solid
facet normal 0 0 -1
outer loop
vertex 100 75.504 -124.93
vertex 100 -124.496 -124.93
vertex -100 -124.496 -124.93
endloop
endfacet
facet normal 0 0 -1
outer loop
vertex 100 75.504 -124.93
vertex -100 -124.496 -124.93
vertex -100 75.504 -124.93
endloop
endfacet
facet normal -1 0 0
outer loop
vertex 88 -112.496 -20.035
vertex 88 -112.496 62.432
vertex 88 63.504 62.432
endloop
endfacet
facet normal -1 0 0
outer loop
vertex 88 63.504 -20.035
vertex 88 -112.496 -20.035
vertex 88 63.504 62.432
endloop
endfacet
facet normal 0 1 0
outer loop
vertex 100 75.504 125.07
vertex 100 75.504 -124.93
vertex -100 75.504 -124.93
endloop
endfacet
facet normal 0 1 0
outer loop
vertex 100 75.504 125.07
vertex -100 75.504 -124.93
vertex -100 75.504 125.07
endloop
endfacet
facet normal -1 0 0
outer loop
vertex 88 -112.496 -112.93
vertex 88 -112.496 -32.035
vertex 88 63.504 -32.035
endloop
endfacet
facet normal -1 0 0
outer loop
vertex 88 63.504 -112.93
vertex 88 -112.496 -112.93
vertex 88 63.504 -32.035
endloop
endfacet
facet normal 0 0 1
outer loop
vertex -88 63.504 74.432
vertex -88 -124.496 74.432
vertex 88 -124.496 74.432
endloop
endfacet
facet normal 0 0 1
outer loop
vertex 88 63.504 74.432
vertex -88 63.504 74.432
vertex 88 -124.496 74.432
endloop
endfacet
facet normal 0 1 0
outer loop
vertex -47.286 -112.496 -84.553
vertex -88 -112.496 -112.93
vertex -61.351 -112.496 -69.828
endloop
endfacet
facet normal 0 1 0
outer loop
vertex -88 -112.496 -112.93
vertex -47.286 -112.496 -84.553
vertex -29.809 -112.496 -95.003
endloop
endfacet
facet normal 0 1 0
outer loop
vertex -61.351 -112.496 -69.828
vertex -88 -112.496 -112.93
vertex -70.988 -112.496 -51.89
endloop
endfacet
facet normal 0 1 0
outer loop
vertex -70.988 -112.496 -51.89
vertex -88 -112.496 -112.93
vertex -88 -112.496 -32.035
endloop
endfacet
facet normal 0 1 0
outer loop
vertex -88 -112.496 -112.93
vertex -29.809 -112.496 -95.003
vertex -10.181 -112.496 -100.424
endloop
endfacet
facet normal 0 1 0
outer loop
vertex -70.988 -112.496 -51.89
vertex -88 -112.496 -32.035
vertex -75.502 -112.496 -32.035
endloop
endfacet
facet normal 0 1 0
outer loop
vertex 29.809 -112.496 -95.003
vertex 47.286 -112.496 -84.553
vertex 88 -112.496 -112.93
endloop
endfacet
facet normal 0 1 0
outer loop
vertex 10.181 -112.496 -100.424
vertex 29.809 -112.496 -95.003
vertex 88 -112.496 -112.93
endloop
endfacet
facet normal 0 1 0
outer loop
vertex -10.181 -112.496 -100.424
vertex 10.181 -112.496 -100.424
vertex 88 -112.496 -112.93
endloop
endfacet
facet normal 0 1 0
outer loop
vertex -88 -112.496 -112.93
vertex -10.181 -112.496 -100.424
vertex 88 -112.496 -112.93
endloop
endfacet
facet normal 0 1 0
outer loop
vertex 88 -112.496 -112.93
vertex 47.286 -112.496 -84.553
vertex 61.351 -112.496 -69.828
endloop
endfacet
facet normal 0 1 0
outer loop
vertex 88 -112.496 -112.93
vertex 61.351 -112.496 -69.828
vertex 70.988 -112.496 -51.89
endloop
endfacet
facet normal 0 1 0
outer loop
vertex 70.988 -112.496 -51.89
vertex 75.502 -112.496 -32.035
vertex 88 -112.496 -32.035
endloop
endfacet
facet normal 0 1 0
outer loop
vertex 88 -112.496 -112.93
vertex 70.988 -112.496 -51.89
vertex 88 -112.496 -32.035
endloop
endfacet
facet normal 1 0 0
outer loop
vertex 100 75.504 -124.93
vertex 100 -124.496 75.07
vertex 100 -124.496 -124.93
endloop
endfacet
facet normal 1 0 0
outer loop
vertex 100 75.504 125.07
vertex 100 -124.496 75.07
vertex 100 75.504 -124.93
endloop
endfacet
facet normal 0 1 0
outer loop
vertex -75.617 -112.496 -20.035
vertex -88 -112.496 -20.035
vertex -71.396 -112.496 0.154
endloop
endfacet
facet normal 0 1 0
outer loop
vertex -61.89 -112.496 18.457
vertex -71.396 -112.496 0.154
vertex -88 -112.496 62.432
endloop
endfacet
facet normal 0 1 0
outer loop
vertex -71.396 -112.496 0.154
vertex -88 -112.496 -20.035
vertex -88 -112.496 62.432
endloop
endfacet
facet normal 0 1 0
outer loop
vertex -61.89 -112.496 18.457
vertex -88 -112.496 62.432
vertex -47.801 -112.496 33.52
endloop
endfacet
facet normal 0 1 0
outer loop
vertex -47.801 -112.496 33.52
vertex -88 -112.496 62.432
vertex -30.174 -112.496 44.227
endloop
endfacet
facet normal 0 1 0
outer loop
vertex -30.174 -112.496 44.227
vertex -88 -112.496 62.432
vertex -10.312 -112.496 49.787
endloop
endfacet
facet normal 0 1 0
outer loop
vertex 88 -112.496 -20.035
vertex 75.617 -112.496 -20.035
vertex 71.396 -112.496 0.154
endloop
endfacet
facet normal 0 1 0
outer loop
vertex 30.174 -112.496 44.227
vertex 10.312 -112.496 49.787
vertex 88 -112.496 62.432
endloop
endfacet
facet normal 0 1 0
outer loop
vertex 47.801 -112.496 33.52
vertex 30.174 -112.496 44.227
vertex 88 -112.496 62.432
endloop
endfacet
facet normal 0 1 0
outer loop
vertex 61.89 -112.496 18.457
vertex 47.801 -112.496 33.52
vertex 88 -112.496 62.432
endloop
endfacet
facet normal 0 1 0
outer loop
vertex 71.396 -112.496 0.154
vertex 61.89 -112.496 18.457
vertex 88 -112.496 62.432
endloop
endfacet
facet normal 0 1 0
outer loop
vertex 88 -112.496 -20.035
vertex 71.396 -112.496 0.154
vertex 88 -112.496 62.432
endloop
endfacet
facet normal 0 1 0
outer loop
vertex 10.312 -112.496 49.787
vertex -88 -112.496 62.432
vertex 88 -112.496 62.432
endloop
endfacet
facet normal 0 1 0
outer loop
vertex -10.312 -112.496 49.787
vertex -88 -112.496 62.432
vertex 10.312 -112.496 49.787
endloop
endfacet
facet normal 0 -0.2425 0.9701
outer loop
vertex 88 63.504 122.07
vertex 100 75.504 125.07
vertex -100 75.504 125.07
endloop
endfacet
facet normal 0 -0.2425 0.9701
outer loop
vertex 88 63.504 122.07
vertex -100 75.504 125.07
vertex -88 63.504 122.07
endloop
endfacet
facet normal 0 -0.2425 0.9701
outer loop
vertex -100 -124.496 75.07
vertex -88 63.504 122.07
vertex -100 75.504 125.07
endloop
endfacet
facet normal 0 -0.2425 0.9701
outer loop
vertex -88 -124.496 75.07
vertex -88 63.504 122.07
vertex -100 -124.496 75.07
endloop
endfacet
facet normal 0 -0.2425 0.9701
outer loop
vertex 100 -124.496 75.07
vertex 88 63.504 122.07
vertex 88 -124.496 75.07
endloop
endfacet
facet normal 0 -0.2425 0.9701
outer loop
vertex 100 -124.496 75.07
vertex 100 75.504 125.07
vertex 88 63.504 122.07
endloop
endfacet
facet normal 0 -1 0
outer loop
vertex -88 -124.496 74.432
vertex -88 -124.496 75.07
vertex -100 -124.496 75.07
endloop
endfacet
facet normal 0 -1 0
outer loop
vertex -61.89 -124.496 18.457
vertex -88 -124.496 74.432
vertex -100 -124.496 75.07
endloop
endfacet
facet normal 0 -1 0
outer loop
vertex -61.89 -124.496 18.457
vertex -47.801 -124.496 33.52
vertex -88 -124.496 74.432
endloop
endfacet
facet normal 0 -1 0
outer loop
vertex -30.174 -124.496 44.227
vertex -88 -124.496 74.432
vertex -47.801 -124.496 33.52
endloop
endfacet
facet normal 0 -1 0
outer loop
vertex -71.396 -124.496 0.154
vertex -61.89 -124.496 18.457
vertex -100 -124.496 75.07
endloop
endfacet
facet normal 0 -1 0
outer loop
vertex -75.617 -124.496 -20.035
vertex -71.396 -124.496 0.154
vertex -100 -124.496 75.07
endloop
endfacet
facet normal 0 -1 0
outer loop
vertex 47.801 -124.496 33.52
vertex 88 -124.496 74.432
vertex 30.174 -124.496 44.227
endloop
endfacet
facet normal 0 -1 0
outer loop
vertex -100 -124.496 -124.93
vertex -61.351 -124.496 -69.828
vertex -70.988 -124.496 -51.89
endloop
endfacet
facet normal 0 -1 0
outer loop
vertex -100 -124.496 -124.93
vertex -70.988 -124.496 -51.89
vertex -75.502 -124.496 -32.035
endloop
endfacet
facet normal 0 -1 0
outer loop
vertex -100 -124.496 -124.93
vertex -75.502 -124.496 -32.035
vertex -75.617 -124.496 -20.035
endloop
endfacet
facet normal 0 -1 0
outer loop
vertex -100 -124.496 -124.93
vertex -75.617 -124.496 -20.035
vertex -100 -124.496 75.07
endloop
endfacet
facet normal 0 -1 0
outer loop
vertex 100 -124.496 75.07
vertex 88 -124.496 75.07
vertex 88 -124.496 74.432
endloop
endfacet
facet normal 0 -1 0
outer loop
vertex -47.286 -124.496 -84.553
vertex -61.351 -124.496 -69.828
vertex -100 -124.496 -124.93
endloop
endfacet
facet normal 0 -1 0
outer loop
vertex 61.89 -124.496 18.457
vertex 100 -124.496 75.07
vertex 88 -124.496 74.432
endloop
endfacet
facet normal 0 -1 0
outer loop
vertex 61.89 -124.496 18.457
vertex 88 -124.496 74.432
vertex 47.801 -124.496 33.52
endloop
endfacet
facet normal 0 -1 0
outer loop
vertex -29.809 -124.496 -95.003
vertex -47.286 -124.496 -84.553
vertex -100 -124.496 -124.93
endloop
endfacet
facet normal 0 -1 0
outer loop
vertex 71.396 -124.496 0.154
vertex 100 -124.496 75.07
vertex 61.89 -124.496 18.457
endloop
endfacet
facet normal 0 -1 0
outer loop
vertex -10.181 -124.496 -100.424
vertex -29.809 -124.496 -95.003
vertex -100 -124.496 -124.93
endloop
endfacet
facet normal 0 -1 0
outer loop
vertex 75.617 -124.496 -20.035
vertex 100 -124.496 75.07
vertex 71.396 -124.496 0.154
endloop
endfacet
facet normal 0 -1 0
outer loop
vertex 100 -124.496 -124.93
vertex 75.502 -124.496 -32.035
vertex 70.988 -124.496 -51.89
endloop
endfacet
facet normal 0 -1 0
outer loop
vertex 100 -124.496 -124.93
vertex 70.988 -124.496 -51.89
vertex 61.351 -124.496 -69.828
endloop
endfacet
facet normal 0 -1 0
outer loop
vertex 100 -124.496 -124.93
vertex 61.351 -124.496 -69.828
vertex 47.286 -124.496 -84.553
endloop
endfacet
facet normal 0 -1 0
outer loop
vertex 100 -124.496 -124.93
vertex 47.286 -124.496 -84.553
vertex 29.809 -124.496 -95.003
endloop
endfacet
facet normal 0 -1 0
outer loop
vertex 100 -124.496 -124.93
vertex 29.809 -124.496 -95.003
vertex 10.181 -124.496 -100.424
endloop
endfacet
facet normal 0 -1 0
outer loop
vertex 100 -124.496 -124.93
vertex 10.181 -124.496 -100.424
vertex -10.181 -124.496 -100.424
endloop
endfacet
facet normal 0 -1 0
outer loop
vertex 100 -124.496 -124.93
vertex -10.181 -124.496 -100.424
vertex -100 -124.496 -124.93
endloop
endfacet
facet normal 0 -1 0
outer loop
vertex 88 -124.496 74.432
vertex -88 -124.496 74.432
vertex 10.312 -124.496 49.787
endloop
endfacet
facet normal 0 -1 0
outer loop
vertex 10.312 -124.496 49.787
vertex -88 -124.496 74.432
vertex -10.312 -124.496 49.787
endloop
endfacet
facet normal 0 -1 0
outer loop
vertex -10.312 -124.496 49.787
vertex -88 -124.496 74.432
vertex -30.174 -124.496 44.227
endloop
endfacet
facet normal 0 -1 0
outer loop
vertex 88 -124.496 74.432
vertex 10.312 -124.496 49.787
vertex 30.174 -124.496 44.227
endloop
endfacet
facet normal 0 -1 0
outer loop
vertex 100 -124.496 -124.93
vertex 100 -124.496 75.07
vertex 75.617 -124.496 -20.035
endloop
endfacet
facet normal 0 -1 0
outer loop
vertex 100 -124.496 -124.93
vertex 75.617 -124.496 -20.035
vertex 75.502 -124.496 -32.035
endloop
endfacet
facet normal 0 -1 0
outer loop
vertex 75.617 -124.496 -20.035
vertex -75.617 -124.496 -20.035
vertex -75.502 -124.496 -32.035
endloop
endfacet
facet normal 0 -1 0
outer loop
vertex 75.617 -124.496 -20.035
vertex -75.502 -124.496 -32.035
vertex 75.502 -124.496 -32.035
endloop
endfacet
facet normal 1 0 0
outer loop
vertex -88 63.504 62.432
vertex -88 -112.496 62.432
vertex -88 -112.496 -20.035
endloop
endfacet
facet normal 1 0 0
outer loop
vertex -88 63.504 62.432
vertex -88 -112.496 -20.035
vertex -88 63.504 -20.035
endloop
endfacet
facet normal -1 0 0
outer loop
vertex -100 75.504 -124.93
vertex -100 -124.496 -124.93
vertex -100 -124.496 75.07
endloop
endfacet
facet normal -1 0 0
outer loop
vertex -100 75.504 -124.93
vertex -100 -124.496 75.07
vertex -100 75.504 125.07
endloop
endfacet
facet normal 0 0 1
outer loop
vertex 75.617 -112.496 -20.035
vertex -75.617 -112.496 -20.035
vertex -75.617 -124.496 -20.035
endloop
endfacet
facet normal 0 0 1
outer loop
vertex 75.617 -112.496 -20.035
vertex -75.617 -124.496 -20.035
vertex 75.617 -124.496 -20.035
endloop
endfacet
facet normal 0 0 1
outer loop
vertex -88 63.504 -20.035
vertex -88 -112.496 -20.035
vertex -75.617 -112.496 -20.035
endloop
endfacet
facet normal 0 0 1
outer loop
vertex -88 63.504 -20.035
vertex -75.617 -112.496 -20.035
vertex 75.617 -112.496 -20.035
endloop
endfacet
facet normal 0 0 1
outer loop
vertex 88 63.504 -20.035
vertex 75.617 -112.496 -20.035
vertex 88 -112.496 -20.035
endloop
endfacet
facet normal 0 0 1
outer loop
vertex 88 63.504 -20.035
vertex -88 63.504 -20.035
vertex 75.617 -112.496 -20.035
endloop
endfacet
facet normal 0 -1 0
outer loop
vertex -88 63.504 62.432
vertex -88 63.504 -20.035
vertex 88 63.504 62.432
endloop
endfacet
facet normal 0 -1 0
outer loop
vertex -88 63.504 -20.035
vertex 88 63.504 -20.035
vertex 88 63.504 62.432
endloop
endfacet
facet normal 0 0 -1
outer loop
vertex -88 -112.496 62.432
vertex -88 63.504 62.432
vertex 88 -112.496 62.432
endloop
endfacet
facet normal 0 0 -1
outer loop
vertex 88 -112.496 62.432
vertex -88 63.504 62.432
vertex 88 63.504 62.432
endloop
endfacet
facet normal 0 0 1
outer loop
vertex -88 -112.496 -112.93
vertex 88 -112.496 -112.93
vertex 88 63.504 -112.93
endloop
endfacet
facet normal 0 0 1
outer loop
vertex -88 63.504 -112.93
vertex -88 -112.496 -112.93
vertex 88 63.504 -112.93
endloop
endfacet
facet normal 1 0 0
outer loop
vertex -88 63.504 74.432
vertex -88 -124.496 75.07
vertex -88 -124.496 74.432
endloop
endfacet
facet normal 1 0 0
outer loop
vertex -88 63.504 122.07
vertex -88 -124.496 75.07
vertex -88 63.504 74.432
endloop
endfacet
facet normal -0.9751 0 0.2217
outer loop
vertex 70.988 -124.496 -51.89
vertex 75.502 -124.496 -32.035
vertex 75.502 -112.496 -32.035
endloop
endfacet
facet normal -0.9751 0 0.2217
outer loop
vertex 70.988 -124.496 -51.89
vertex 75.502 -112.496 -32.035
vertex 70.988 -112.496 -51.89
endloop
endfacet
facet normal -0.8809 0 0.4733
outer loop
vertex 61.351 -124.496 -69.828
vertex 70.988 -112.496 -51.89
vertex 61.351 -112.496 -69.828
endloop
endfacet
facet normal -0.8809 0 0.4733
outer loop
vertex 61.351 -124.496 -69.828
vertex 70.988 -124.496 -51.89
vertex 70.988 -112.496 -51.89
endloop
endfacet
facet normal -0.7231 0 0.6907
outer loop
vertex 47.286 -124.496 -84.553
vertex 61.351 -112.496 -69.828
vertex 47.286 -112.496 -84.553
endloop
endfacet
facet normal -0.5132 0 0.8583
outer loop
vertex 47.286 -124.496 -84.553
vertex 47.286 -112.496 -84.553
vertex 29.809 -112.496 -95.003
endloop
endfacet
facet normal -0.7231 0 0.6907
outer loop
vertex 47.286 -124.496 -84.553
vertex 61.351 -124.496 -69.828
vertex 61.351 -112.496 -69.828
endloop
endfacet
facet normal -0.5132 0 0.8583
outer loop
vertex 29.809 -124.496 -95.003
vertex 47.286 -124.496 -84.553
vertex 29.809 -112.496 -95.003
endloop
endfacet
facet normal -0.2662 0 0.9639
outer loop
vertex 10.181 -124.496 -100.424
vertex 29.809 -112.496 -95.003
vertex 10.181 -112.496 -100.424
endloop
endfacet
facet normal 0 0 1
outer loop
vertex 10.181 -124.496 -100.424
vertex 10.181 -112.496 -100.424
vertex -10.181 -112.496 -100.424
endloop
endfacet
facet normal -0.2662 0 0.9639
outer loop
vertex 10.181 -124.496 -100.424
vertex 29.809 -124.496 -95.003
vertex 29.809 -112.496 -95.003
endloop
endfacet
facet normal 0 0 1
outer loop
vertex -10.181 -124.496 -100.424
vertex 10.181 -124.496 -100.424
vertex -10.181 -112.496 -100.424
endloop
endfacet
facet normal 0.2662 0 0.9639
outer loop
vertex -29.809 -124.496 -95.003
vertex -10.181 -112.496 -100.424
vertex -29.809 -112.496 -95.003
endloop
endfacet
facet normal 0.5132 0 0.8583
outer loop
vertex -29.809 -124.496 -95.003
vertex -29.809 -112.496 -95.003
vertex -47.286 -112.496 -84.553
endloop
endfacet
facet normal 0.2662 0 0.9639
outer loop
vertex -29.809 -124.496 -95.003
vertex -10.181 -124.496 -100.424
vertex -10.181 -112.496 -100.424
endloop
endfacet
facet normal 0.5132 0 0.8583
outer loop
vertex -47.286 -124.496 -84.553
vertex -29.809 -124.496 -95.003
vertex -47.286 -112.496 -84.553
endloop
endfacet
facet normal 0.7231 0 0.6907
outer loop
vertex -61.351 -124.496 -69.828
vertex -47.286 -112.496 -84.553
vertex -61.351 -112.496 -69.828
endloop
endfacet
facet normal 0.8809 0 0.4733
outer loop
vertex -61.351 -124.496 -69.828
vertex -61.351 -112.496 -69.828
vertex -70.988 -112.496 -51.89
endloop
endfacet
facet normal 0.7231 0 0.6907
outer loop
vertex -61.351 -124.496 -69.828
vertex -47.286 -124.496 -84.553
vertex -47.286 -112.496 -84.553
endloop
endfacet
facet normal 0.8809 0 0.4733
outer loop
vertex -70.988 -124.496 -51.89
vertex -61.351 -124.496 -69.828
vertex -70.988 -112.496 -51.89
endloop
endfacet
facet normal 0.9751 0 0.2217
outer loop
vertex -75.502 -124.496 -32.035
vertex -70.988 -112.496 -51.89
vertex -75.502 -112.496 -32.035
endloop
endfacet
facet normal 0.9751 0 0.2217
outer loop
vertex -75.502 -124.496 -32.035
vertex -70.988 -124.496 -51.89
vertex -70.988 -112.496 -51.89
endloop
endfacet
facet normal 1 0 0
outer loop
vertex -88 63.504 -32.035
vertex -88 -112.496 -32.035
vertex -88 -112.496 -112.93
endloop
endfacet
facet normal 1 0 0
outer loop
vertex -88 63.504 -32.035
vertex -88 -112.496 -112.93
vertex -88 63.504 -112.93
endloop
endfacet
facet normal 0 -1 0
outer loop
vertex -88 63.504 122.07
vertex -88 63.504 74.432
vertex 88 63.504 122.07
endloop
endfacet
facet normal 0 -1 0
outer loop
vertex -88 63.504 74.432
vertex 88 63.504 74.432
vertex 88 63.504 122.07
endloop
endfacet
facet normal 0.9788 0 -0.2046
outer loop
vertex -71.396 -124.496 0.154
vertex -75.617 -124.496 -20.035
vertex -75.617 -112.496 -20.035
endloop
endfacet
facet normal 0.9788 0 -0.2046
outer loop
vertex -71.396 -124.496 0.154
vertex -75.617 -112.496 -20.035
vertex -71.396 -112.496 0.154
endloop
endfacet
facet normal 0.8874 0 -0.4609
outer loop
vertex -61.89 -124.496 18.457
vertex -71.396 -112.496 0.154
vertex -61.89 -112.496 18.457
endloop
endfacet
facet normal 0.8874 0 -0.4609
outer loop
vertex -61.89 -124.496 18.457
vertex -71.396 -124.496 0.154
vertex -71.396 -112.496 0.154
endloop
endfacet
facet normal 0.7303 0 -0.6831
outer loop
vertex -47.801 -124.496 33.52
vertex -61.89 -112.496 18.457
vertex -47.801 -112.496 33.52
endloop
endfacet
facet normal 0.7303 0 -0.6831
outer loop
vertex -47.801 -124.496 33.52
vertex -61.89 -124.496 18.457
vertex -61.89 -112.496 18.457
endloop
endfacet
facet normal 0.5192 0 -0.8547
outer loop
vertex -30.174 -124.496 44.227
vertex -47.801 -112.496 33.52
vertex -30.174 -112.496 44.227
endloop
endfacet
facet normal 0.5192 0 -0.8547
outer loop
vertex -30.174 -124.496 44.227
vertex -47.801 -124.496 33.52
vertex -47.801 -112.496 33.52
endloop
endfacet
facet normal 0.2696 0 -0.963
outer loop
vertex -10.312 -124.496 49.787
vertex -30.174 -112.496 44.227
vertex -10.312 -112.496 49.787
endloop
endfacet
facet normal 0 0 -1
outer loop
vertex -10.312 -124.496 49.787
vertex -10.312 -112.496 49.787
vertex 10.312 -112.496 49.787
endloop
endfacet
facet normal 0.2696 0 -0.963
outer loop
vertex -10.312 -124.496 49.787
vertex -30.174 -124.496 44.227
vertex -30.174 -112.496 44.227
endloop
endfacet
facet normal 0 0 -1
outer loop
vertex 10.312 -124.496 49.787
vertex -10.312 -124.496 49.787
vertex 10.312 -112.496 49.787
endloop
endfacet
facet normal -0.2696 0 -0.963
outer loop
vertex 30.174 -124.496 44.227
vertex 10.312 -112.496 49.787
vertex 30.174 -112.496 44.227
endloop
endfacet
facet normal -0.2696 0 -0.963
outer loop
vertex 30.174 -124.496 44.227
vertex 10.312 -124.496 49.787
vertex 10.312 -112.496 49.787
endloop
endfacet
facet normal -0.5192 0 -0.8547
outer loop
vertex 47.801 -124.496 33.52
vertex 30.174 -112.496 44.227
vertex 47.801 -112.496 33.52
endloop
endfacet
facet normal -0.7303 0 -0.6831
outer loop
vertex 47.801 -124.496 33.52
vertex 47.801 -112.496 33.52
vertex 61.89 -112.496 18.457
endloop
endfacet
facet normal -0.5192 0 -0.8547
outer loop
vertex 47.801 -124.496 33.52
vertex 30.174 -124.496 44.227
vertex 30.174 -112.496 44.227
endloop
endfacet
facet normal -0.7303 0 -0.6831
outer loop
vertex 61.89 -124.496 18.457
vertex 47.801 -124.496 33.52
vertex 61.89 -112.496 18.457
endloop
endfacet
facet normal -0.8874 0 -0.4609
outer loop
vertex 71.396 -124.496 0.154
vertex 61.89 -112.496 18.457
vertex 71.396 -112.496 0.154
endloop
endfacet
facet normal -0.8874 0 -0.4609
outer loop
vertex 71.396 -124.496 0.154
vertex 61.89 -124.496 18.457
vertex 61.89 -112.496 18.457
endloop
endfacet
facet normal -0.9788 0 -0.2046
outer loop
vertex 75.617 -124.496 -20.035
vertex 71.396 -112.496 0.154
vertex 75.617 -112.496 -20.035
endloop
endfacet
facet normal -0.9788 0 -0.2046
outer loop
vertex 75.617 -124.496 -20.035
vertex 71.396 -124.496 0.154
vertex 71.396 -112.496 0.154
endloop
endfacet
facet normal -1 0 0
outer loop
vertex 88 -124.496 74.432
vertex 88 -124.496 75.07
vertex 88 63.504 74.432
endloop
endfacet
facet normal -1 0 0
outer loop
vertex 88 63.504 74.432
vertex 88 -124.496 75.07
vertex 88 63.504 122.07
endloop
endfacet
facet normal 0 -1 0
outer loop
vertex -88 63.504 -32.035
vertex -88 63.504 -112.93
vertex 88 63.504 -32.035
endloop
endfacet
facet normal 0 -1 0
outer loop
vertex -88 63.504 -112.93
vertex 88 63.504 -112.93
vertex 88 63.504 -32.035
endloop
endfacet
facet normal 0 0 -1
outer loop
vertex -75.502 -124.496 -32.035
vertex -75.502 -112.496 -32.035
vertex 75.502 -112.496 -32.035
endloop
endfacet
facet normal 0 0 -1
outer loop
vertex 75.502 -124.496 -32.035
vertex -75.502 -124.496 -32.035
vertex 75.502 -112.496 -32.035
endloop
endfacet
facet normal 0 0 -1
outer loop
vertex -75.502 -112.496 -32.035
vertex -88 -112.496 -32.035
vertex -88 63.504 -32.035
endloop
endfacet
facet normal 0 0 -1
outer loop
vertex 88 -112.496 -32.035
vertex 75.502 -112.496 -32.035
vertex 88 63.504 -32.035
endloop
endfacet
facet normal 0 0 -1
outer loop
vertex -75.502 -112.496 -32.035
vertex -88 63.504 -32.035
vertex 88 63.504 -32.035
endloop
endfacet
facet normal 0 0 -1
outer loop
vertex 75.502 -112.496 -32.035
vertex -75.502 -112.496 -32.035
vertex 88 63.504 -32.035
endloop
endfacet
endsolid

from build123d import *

# Parameters (mm, degrees)
F1_DEPTH = 100
F2_T     = -12
F3_W     = 176
F3_H     = 12
F4_DEPTH = 188
F6_DEPTH = 12


with BuildPart() as f1:
    # F0 (on Right) → F1 (new body, symmetric)
    with BuildSketch(Plane.YZ):
        Polygon((-124.4957186917, 75.0704253932), (-124.4957186917, -124.9295746068), (75.5042813083, -124.9295746068), (75.5042813083, 125.0704253932), align=None)
    extrude(amount=F1_DEPTH, both=True)

    # F2
    f2_openings = [f1.faces().sort_by_distance(p)[0] for p in [
        (0, -124.495719, -24.929575),
        (0, -24.495719, 100.070425),
    ]]
    offset(amount=F2_T, openings=f2_openings)

    # F3 (on face) → F4 (join)
    with BuildSketch(Plane.XZ.offset(-63.5042813083)):
        with Locations((0, -26.0345488787)):
            Rectangle(F3_W, F3_H)
        with Locations((0, 68.4323040247)):
            Rectangle(F3_W, F3_H)
    extrude(amount=F4_DEPTH)

    # F5 (on face) → F6 (join)
    with BuildSketch(Plane.XZ.offset(124.4957186917)):
        Polygon((100, -124.9295746068), (100, 75.0704253932), (88, 75.0704253932), (88, 74.4323040247), (-88, 74.4323040247), (-88, 75.0704253932), (-100, 75.0704253932), (-100, -124.9295746068), align=None)
        Polygon((88, -112.9295746068), (-88, -112.9295746068), (-88, -32.0345488787), (-88, -20.0345488787), (-88, 62.4323040247), (88, 62.4323040247), (88, -20.0345488787), (88, -32.0345488787), align=None, mode=Mode.SUBTRACT)
        with BuildLine():
            Line((-88, 62.4323040247), (-88, -20.0345488787))
            Line((-88, -20.0345488787), (-75.6174618507, -20.0345488787))
            ThreePointArc((-75.6174618507, -20.0345488787), (0, 50.4918066225), (75.6174618507, -20.0345488787))
            Line((75.6174618507, -20.0345488787), (88, -20.0345488787))
            Line((88, -20.0345488787), (88, 62.4323040247))
            Line((88, 62.4323040247), (-88, 62.4323040247))
        make_face()
        with BuildLine():
            Line((-88, -32.0345488787), (-88, -112.9295746068))
            Line((-88, -112.9295746068), (88, -112.9295746068))
            Line((88, -112.9295746068), (88, -32.0345488787))
            Line((88, -32.0345488787), (75.5022996144, -32.0345488787))
            ThreePointArc((75.5022996144, -32.0345488787), (0, -101.1106302402), (-75.5022996144, -32.0345488787))
            Line((-75.5022996144, -32.0345488787), (-88, -32.0345488787))
        make_face()
    extrude(amount=-F6_DEPTH)


solid = f1.part
